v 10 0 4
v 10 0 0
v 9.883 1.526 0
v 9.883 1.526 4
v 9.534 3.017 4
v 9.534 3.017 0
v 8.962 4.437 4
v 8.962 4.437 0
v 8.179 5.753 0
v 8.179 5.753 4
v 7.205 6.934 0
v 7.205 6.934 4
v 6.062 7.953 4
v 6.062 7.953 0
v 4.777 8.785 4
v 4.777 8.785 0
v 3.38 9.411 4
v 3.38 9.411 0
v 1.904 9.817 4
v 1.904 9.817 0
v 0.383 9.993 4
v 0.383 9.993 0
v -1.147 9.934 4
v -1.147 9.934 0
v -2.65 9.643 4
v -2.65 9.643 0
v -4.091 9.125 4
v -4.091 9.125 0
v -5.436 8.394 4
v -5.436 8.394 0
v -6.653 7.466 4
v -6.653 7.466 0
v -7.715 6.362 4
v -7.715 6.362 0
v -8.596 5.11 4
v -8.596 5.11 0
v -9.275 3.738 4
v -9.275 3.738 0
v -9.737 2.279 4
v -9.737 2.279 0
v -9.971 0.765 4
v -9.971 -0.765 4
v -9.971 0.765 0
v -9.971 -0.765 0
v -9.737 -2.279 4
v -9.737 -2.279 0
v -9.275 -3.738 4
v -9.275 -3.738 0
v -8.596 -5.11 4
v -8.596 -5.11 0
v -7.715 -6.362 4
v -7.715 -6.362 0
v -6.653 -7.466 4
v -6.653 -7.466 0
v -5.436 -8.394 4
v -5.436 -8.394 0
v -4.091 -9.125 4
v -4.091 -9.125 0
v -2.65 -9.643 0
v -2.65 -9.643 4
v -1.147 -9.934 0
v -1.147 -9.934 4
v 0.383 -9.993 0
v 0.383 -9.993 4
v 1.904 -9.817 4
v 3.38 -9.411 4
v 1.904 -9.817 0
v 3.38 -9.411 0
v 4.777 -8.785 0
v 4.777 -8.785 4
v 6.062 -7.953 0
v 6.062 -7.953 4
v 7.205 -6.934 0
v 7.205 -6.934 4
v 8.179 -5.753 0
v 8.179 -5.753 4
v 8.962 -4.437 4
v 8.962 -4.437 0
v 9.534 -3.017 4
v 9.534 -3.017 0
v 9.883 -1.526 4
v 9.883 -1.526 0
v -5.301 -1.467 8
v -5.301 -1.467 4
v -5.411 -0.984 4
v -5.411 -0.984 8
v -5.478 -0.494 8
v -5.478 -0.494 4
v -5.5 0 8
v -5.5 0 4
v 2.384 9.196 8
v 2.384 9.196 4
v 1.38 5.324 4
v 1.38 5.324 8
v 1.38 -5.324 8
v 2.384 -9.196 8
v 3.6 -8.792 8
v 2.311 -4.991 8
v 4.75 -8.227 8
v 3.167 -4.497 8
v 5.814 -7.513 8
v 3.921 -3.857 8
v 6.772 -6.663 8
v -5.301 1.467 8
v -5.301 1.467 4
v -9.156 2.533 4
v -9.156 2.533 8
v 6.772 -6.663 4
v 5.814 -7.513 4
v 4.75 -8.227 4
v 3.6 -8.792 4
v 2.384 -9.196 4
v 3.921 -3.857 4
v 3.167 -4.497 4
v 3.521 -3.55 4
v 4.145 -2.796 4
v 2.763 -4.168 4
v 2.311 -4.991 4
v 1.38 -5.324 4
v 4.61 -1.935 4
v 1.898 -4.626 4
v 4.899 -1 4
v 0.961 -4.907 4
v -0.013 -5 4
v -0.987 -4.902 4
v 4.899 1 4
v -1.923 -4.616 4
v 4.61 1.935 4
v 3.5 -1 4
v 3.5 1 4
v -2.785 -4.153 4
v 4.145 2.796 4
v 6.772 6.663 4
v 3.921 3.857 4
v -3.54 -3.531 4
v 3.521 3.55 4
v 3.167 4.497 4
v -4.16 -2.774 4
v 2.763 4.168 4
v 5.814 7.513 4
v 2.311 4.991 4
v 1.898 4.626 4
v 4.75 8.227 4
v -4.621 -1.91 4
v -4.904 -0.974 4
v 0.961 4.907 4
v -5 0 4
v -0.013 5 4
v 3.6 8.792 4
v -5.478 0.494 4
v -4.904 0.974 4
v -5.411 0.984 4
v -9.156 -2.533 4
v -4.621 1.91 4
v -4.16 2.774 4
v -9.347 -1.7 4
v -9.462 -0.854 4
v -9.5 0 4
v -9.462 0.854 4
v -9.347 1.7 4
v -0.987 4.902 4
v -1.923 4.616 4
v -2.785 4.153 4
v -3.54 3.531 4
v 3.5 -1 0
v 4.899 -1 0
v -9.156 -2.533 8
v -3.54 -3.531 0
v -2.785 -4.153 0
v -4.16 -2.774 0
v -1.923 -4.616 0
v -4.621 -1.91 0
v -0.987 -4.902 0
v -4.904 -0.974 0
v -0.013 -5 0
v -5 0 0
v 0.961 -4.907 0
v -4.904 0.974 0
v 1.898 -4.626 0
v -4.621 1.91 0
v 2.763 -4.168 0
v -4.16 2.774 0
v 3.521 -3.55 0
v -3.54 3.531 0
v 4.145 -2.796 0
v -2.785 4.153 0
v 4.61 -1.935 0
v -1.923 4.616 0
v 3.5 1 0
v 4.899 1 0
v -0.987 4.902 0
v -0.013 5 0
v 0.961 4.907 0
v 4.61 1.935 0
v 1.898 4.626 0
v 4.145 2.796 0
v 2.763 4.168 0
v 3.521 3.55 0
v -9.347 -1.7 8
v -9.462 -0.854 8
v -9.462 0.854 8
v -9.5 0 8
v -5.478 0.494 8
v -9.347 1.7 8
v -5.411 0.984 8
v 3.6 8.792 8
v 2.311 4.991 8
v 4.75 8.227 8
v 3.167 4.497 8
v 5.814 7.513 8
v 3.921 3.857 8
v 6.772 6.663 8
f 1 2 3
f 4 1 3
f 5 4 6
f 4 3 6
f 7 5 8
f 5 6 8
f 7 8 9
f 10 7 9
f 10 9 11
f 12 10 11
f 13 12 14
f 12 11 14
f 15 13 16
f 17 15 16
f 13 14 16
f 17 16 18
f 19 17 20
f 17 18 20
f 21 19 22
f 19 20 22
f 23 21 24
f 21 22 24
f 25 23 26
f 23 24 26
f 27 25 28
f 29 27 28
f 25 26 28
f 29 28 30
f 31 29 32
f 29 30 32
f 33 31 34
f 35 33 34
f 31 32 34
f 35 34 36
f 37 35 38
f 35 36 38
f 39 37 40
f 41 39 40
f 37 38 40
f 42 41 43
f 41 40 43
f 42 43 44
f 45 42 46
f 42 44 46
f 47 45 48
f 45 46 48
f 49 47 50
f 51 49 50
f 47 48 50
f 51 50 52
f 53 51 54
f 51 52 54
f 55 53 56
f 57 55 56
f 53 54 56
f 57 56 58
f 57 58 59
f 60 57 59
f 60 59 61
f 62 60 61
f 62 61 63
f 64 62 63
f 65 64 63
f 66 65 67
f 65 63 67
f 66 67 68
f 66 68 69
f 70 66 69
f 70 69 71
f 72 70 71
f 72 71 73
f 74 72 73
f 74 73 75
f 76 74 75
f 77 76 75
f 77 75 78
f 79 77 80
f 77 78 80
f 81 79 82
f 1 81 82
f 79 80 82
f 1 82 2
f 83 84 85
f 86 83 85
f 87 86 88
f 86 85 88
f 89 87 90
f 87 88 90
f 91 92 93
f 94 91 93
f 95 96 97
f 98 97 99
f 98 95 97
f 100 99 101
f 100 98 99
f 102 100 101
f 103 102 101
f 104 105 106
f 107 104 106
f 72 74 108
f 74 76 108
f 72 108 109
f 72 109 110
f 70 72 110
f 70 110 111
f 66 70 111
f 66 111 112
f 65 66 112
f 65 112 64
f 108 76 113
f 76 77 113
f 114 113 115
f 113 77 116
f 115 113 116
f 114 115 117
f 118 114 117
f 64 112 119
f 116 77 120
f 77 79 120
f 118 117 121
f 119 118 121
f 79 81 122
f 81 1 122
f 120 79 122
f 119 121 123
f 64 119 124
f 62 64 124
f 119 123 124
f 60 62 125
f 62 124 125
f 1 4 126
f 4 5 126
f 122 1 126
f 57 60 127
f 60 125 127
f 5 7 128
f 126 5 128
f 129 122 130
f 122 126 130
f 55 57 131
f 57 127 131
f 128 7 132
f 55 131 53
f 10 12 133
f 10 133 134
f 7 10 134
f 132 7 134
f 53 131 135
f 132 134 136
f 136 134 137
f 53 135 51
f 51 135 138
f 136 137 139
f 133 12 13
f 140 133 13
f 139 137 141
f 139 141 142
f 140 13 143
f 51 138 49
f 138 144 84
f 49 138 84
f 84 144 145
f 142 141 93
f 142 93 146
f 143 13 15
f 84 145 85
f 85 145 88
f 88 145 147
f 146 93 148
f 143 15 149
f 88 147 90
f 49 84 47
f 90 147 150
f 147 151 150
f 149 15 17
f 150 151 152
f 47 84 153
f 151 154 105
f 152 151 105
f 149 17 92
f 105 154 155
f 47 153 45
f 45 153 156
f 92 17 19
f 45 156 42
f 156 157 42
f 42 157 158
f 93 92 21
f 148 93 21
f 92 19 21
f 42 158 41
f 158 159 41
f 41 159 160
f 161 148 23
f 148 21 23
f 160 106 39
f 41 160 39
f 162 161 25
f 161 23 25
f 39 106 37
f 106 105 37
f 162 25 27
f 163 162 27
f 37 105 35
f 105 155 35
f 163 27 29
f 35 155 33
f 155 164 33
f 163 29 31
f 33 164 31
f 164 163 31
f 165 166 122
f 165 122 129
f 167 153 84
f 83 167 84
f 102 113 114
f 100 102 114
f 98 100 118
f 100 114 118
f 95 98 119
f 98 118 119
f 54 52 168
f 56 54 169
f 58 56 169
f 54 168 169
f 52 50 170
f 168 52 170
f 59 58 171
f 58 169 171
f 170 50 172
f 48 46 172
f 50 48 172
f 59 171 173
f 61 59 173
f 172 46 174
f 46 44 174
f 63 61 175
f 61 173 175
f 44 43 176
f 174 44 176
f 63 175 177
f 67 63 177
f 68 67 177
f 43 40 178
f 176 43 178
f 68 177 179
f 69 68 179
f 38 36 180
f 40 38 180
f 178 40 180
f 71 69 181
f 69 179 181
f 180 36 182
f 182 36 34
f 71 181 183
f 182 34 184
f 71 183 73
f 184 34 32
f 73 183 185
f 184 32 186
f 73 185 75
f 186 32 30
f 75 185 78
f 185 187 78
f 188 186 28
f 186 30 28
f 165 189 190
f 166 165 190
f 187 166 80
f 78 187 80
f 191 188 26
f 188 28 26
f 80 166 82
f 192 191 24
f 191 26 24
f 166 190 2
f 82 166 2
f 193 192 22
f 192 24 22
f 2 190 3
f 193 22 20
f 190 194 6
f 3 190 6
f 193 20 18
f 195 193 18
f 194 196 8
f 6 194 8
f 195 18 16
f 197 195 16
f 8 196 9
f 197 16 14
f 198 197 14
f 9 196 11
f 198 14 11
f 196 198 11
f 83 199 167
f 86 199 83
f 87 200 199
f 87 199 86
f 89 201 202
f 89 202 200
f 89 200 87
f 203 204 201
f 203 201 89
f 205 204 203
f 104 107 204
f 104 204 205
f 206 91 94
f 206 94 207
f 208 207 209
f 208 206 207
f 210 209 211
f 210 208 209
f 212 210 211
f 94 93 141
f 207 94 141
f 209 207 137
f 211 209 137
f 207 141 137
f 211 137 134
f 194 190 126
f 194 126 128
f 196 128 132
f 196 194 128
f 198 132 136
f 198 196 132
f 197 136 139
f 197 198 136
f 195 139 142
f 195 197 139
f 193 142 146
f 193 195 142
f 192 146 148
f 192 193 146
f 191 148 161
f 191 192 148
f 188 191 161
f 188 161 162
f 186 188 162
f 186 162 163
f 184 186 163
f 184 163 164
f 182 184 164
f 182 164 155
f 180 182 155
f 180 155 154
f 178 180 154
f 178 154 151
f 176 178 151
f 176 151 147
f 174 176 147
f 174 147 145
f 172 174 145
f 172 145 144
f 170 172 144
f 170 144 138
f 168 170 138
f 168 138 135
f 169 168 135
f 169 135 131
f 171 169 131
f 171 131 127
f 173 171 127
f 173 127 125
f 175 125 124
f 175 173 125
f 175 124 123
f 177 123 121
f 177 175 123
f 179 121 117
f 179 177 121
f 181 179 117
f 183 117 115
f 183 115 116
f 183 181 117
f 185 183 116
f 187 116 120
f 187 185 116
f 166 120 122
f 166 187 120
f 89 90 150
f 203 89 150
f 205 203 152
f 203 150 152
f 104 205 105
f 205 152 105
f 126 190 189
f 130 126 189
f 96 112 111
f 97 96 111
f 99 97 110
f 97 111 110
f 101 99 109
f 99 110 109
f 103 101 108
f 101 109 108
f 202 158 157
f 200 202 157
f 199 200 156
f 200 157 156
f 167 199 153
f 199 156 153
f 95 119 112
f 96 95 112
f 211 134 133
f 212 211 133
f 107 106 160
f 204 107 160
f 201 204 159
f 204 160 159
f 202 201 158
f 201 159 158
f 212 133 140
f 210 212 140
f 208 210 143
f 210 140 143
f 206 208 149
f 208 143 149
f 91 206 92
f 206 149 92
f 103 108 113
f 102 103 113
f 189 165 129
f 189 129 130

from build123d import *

# Parameters (mm, degrees)
SKETCH1_R           = 10
SKETCH1_R_2         = 5
BOSS_EXTRUDE2_DEPTH = 4
BOSS_EXTRUDE3_DEPTH = 4
SKETCH3_W           = 3
SKETCH3_H           = 2
BOSS_EXTRUDE4_DEPTH = 4


with BuildPart() as part:
    # Sketch1 → Boss-Extrude2 (new body)
    with BuildSketch(Plane.XY):
        Circle(SKETCH1_R)
        Circle(SKETCH1_R_2, mode=Mode.SUBTRACT)
    extrude(amount=BOSS_EXTRUDE2_DEPTH)

    # Sketch2 → Boss-Extrude3 (add)
    with BuildSketch(Plane.XY.offset(4)):
        with BuildLine():
            ThreePointArc((-5.5, 0), (-5.449982192, 0.74006358), (-5.300838508, 1.466666667))
            Line((-5.300838508, 1.466666667), (-9.155993787, 2.533333333))
            ThreePointArc((-9.155993787, 2.533333333), (-9.413605605, 1.278291639), (-9.5, 0))
            ThreePointArc((-9.5, 0), (-9.413605605, -1.278291639), (-9.155993787, -2.533333333))
            Line((-9.155993787, -2.533333333), (-5.300838508, -1.466666667))
            ThreePointArc((-5.300838508, -1.466666667), (-5.449982192, -0.74006358), (-5.5, 0))
        make_face()
        with BuildLine():
            ThreePointArc((3.920589846, -3.857327476), (2.75, -4.763139721), (1.380248662, -5.323994143))
            Line((1.380248662, -5.323994143), (2.38406587, -9.195989883))
            ThreePointArc((2.38406587, -9.195989883), (4.75, -8.227241336), (6.771927916, -6.66265655))
            Line((6.771927916, -6.66265655), (3.920589846, -3.857327476))
        make_face()
        with BuildLine():
            Line((2.38406587, 9.195989883), (1.380248662, 5.323994143))
            ThreePointArc((1.380248662, 5.323994143), (2.75, 4.763139721), (3.920589846, 3.857327476))
            Line((3.920589846, 3.857327476), (6.771927916, 6.66265655))
            ThreePointArc((6.771927916, 6.66265655), (4.75, 8.227241336), (2.38406587, 9.195989883))
        make_face()
    extrude(amount=BOSS_EXTRUDE3_DEPTH)

    # Sketch3 → Boss-Extrude4 (add)
    with BuildSketch(Plane(origin=(0, 0, 0), x_dir=(-1, 0, 0), z_dir=(0, 0, -1))):
        with Locations((-5, 0)):
            Rectangle(SKETCH3_W, SKETCH3_H)
    extrude(amount=-BOSS_EXTRUDE4_DEPTH)


solid = part.part
